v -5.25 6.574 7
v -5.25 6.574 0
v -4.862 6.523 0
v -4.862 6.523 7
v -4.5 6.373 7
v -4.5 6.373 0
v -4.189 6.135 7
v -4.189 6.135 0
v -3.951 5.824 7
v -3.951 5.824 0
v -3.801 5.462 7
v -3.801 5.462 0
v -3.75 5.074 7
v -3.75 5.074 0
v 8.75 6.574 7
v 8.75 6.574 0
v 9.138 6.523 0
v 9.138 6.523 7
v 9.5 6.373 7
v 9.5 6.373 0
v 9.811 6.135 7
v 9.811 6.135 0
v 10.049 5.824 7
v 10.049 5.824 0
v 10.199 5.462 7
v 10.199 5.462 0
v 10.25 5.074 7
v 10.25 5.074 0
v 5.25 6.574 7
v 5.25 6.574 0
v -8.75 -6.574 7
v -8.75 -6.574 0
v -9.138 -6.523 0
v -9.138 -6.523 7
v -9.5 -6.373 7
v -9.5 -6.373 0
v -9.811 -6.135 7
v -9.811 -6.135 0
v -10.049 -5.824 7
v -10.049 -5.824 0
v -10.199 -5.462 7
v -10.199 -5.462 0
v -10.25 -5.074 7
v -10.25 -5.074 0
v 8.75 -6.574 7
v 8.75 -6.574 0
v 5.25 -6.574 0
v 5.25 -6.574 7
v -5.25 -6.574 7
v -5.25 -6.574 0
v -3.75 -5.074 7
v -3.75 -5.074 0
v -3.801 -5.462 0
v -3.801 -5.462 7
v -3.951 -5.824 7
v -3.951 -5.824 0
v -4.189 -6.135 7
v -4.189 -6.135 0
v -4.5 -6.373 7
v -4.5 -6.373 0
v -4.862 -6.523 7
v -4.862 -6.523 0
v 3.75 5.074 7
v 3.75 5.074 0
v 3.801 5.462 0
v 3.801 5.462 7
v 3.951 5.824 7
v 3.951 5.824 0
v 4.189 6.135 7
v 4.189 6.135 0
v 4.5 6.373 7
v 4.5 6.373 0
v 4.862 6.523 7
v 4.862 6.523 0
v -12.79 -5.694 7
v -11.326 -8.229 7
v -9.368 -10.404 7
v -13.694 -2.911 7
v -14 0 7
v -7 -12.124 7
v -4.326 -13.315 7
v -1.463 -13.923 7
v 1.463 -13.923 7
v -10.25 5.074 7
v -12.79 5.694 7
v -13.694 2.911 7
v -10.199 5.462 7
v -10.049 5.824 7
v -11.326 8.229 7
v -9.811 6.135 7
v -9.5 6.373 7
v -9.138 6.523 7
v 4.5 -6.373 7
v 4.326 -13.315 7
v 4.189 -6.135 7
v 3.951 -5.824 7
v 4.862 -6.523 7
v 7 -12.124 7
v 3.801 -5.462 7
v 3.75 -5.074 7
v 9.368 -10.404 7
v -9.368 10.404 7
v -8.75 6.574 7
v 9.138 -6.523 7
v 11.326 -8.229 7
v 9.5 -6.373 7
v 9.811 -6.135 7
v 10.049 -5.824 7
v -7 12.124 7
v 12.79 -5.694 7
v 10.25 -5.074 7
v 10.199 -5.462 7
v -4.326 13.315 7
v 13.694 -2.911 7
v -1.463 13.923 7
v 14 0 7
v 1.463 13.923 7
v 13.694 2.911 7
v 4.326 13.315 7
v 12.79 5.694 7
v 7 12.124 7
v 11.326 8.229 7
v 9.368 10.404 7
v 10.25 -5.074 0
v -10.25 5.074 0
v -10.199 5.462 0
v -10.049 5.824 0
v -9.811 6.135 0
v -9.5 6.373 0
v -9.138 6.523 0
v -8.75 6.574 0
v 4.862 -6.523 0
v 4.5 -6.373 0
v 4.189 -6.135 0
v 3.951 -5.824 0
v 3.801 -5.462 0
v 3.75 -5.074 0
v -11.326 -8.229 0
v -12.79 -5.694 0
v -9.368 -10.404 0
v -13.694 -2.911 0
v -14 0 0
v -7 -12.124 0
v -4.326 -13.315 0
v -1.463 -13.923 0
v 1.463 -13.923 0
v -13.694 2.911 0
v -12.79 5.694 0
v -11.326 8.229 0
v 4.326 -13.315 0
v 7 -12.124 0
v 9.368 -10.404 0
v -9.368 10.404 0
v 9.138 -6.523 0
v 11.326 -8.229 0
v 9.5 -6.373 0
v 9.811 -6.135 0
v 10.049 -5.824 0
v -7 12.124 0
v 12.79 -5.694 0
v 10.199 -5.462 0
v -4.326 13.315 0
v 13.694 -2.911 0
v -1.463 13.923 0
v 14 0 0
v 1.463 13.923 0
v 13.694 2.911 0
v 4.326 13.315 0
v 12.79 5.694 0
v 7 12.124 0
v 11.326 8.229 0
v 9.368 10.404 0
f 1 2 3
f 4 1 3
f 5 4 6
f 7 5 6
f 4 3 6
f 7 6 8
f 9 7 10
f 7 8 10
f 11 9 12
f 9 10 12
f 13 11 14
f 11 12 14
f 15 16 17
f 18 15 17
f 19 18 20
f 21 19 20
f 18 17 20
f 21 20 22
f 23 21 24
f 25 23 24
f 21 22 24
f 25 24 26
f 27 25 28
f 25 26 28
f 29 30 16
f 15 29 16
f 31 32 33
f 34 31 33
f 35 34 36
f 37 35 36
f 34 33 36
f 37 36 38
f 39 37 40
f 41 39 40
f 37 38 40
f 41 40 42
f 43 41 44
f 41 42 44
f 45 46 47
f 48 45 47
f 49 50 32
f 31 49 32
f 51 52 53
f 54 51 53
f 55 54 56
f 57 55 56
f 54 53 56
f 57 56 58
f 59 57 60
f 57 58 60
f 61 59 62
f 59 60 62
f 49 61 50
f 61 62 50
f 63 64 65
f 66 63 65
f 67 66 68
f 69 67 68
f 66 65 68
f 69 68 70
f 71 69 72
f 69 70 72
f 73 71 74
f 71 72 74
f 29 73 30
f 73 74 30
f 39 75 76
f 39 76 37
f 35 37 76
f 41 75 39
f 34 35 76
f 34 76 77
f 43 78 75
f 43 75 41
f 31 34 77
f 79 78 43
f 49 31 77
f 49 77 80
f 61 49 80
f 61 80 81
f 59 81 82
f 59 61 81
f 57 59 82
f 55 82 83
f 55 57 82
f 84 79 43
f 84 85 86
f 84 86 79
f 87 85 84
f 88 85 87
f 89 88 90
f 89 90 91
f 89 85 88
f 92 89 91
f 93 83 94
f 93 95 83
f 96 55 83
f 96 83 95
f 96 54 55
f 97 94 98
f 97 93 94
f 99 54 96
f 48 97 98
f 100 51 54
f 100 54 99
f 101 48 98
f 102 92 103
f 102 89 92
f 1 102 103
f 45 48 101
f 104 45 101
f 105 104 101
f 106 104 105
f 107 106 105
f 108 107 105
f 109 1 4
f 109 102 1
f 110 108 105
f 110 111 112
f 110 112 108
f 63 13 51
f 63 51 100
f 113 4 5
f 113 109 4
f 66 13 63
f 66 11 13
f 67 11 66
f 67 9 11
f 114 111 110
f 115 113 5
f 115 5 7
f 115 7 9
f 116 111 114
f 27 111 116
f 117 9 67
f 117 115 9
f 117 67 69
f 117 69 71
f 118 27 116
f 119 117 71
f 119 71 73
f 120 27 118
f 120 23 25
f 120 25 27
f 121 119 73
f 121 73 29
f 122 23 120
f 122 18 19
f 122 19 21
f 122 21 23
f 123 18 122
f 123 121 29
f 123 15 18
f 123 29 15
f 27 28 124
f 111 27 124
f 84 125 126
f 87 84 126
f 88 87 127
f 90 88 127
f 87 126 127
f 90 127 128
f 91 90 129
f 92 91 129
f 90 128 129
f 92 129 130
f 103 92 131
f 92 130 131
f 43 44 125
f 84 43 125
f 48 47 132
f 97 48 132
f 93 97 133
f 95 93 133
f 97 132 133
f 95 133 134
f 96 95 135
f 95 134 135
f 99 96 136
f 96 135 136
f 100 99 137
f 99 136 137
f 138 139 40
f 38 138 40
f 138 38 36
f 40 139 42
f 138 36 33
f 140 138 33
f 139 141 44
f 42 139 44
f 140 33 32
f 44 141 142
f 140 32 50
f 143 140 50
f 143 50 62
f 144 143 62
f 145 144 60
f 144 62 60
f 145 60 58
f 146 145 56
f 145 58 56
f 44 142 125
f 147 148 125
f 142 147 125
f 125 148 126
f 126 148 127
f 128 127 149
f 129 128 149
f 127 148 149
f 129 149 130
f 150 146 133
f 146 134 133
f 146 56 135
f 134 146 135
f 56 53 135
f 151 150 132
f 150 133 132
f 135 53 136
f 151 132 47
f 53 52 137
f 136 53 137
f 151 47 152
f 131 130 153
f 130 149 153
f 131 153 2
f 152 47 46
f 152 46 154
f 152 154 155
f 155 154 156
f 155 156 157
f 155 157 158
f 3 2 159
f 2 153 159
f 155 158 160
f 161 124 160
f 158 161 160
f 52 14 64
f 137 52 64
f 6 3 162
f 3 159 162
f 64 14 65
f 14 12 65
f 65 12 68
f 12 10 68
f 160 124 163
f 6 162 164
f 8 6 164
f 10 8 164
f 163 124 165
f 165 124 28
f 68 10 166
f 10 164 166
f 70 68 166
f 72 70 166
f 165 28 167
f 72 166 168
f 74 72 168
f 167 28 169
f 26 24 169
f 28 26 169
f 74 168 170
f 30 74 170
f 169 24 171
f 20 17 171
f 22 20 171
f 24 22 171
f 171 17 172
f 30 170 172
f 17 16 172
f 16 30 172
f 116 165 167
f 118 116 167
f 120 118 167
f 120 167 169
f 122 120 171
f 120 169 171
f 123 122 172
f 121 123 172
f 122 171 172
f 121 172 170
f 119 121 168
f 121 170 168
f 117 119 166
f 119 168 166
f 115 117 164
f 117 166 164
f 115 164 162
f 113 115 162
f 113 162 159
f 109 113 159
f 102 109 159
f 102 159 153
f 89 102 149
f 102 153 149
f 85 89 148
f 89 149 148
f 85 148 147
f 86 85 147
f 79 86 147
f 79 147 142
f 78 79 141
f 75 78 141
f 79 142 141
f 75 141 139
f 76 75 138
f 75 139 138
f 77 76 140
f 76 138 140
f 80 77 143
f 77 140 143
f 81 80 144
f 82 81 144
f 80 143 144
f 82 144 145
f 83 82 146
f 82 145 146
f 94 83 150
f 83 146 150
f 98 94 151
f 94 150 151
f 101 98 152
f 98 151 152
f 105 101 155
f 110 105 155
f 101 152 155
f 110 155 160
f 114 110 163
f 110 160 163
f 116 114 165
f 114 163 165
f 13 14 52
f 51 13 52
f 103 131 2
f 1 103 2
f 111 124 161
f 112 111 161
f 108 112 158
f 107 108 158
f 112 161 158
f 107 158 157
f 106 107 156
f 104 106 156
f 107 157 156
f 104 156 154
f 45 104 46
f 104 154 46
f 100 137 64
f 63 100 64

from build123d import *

# Parameters (mm, degrees)
F0_R     = 14
F1_DEPTH = 7


with BuildPart() as f1:
    # F0 (on Top) → F1 (new body)
    with BuildSketch(Plane.XY):
        Circle(F0_R)
        with BuildLine():
            Line((-8.75, 6.573926), (-5.25, 6.573926))
            ThreePointArc((-5.25, 6.573926), (-4.18934, 6.134586), (-3.75, 5.073926))
            Line((-3.75, 5.073926), (-3.75, -5.073926))
            ThreePointArc((-3.75, -5.073926), (-4.18934, -6.134586), (-5.25, -6.573926))
            Line((-5.25, -6.573926), (-8.75, -6.573926))
            ThreePointArc((-8.75, -6.573926), (-9.81066, -6.134586), (-10.25, -5.073926))
            Line((-10.25, -5.073926), (-10.25, 5.073926))
            ThreePointArc((-10.25, 5.073926), (-9.81066, 6.134586), (-8.75, 6.573926))
        make_face(mode=Mode.SUBTRACT)
        with BuildLine():
            Line((10.25, 5.073926), (10.25, -5.073926))
            ThreePointArc((10.25, -5.073926), (9.81066, -6.134586), (8.75, -6.573926))
            Line((8.75, -6.573926), (5.25, -6.573926))
            ThreePointArc((5.25, -6.573926), (4.18934, -6.134586), (3.75, -5.073926))
            Line((3.75, -5.073926), (3.75, 5.073926))
            ThreePointArc((3.75, 5.073926), (4.18934, 6.134586), (5.25, 6.573926))
            Line((5.25, 6.573926), (8.75, 6.573926))
            ThreePointArc((8.75, 6.573926), (9.81066, 6.134586), (10.25, 5.073926))
        make_face(mode=Mode.SUBTRACT)
    extrude(amount=F1_DEPTH)


solid = f1.part
